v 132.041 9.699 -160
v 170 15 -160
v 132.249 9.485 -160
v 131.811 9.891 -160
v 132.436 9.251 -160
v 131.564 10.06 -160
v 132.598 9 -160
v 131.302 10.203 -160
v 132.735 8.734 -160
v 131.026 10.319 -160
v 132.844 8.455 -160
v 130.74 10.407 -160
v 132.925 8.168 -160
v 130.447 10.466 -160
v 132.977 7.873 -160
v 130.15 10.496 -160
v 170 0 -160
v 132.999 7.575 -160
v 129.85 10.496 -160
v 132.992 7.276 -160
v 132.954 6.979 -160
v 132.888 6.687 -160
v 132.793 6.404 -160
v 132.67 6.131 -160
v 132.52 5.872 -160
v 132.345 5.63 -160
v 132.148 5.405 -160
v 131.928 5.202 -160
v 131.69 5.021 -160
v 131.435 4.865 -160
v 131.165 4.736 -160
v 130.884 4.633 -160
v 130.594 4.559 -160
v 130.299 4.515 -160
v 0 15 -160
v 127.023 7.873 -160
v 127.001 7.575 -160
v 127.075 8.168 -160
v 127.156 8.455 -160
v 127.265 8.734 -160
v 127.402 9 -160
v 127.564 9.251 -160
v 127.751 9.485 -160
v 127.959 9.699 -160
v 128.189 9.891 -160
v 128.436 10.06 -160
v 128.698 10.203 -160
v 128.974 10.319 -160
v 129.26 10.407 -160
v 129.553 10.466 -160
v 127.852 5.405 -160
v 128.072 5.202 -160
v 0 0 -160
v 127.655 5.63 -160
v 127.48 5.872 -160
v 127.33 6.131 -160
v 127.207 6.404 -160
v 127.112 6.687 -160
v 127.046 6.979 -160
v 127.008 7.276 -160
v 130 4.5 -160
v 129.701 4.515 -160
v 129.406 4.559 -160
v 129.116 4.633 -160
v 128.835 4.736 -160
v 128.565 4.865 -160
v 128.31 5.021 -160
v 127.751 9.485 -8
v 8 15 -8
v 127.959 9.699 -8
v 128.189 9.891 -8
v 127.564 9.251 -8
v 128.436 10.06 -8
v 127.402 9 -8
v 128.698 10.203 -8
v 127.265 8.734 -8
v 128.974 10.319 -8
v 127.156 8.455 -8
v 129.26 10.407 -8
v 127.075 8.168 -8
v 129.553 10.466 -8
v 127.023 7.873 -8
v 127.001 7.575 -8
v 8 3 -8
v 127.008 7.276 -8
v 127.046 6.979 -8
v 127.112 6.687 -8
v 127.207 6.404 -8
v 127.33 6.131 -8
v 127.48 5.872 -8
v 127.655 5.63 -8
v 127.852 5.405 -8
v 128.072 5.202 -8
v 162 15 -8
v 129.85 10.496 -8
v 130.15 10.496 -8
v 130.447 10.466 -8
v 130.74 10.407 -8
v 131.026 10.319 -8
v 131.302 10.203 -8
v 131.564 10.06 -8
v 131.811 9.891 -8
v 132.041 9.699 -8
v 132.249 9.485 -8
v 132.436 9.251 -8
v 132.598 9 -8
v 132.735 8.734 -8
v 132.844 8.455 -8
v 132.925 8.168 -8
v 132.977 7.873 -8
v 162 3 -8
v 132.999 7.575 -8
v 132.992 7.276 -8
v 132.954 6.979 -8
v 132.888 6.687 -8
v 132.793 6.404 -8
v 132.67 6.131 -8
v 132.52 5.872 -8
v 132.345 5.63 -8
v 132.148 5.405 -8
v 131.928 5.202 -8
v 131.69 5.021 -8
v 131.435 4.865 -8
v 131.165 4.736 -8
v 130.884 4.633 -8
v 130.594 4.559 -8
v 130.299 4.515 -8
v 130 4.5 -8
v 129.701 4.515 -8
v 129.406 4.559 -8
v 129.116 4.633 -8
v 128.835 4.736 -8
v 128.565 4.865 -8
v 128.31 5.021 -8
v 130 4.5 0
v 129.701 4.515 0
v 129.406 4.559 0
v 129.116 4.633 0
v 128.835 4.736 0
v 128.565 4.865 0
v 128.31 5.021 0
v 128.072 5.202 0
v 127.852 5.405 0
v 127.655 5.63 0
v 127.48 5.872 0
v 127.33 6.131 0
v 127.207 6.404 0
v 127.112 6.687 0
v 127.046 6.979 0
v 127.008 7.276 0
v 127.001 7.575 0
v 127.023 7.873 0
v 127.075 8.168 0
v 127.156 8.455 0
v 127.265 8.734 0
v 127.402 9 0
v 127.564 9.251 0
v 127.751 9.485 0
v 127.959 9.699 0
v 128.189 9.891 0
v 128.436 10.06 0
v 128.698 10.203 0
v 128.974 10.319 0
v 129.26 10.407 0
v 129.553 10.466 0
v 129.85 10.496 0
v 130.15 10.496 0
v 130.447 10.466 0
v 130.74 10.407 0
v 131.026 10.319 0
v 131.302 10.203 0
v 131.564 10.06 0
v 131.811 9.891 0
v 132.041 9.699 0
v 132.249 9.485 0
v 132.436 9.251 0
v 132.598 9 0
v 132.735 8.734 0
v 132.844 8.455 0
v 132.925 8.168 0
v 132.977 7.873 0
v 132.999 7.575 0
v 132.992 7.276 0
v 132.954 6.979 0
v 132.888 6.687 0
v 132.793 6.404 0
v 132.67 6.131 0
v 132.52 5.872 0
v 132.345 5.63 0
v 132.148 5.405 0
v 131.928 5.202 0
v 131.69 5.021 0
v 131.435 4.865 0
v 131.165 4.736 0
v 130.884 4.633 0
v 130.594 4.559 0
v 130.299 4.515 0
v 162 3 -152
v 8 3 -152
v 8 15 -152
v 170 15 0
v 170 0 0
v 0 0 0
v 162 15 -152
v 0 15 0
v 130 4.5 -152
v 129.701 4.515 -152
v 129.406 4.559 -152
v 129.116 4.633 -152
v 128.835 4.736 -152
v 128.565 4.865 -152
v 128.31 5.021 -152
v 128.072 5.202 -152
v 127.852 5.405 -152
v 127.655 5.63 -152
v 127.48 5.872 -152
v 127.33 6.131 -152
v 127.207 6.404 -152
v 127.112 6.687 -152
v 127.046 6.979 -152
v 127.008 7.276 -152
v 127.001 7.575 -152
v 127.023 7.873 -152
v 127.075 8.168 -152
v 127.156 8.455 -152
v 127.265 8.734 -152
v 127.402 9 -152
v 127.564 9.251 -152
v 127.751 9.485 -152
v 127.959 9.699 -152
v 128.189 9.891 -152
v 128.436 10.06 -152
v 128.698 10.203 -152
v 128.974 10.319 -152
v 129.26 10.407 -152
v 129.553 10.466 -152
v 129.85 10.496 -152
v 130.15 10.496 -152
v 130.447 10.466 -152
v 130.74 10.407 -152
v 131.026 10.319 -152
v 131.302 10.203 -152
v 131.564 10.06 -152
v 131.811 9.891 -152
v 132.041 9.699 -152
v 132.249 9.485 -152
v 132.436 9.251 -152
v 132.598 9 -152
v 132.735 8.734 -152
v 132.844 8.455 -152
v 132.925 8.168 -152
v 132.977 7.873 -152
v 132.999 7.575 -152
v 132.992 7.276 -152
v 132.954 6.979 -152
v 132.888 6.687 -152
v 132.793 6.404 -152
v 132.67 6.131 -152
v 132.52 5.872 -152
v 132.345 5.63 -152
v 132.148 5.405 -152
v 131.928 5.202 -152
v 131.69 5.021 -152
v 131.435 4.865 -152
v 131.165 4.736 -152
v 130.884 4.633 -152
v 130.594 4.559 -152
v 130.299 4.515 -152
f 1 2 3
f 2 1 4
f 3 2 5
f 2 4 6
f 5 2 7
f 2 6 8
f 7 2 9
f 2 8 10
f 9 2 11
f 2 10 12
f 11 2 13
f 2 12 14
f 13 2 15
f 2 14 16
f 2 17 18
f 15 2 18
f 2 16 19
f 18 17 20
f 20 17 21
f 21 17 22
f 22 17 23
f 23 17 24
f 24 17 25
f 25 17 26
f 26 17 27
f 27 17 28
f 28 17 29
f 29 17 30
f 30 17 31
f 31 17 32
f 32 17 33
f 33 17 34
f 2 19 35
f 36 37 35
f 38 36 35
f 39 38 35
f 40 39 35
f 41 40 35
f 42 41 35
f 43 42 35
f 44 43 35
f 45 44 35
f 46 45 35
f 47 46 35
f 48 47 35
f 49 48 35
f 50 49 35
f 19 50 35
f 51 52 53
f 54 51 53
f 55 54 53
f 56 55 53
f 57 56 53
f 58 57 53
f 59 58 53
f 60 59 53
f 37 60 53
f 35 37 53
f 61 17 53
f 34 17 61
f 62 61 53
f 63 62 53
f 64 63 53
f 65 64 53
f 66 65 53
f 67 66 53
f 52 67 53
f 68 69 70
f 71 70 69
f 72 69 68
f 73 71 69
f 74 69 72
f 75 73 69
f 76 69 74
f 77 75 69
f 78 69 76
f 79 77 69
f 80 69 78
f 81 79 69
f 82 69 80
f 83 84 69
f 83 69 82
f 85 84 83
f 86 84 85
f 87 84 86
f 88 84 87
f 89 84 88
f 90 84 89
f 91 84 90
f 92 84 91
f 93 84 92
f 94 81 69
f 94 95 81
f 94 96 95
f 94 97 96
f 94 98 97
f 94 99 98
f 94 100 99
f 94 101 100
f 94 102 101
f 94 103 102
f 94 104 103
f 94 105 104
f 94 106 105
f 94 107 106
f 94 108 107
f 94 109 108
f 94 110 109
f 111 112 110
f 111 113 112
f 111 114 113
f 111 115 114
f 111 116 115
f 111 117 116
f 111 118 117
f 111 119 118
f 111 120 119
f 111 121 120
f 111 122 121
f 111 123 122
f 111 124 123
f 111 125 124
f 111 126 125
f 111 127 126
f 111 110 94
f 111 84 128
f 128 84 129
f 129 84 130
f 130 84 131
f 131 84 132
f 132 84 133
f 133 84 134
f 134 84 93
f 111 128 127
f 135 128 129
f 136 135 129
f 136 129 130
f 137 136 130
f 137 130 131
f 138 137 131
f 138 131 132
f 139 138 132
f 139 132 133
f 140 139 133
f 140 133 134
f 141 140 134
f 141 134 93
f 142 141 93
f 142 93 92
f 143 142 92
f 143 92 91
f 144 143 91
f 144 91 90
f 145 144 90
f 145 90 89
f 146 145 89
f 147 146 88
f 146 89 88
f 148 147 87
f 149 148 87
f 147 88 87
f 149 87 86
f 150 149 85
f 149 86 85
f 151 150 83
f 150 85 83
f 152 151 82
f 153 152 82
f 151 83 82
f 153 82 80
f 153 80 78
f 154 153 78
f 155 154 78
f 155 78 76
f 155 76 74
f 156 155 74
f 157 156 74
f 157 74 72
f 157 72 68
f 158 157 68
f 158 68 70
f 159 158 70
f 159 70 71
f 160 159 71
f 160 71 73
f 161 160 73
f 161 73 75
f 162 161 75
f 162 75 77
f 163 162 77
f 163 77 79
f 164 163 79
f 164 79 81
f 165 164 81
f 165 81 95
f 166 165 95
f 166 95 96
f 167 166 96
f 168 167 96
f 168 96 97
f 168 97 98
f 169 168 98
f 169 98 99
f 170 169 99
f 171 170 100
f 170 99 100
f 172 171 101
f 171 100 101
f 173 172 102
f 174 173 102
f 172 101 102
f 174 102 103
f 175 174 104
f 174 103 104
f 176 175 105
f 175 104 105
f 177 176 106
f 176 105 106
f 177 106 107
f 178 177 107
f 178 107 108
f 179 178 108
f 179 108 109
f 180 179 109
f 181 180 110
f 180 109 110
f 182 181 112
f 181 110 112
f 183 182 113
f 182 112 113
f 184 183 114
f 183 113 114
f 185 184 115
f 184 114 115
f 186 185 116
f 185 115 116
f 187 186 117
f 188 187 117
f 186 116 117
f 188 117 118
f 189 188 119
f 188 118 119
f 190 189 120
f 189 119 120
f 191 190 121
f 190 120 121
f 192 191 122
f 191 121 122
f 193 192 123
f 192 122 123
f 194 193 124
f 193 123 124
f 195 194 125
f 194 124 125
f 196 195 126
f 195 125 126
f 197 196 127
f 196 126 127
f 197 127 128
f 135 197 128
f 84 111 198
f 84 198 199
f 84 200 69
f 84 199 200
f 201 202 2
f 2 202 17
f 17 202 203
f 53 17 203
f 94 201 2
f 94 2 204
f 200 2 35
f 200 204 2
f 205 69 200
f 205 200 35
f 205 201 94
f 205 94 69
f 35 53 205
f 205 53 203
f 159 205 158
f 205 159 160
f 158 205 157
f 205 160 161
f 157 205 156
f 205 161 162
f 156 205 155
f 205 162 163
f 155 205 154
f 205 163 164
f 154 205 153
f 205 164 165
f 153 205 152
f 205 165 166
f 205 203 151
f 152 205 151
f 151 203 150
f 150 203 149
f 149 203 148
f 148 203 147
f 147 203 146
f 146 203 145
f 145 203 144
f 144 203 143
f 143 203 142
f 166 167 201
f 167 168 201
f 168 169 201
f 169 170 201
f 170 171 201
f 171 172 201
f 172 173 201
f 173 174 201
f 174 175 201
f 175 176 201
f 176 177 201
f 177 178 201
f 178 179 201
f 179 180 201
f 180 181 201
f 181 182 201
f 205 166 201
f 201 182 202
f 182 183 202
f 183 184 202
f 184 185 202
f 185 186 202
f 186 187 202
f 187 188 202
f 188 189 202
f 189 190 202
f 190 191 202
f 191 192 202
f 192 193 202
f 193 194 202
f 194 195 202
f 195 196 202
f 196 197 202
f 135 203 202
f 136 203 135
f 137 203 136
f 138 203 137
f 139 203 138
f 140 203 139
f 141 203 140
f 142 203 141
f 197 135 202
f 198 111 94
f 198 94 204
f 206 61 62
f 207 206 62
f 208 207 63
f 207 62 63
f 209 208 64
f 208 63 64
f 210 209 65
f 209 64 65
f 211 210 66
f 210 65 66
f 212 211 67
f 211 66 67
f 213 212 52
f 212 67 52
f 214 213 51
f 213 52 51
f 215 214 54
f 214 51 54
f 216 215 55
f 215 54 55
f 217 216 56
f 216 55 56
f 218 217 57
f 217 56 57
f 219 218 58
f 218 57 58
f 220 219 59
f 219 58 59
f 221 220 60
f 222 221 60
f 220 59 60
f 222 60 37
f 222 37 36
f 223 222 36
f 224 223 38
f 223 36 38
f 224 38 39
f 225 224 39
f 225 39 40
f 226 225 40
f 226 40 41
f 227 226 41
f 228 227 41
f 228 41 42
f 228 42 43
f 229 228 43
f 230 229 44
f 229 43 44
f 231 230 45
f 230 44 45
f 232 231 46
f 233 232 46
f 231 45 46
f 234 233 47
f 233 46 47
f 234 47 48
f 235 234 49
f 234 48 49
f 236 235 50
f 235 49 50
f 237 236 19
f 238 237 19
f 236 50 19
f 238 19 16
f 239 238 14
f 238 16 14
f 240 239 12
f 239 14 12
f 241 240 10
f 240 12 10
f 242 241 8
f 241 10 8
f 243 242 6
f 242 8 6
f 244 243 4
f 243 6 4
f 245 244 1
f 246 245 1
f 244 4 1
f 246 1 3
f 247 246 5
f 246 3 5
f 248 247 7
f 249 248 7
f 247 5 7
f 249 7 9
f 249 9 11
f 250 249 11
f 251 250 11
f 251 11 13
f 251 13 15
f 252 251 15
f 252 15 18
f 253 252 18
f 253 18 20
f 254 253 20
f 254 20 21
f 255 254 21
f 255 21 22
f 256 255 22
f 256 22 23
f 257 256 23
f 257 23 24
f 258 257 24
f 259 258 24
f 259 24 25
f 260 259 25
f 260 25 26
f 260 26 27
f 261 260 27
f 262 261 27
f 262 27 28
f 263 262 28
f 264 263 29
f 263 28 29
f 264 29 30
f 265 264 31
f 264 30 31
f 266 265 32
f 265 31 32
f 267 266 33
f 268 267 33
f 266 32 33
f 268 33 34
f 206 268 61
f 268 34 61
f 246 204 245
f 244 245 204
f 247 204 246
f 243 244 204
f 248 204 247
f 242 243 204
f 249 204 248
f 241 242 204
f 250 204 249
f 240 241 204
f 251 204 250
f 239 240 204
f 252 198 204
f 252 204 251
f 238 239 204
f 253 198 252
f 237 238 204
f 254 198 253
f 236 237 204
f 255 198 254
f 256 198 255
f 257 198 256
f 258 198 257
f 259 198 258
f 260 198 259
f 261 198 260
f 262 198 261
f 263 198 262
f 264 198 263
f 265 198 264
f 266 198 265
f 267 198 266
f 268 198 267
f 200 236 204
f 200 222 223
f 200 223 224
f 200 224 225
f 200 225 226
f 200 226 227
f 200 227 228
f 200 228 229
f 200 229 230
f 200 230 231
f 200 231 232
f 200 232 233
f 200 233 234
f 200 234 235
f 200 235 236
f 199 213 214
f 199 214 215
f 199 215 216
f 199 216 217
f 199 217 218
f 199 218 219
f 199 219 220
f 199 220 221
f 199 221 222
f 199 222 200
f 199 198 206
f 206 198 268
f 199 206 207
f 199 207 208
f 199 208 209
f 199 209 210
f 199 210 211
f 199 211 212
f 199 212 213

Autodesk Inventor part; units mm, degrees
ref_plane "YZ Plane" through (0, 0, 0) normal (1, 0, 0) x (0, 1, 0)
ref_plane "XZ Plane" through (0, 0, 0) normal (0, 1, 0) x (-1, 0, 0)
ref_plane "XY Plane" through (0, 0, 0) normal (0, 0, 1) x (1, 0, 0)
sketch "Sketch2" plane through (0, 0, 0) normal (0, 1, 0) x (-1, 0, 0)
  line L0 (0, 0) -> (-170, 0)
  line L1 (-170, 0) -> (-170, -160)
  line L2 (-170, -160) -> (0, -160)
  line L3 (0, -160) -> (0, 0)
  line L4 (-8, -8) -> (-162, -8)
  line L5 (-162, -8) -> (-162, -152)
  line L6 (-162, -152) -> (-8, -152)
  line L7 (-8, -152) -> (-8, -8)
  dimension "d0" = 170
  dimension "d1" = 160
  dimension "d2" = 154
  dimension "d3" = 144
  dimension "d4" = 8
  dimension "d5" = 8
extrude "Extrusion1" add sketch "Sketch2" along normal blind 15
extrude "Extrusion2" add sketch "Sketch2" along normal blind 3 contours L7 L6 L5 L4
sketch "Sketch3" plane through (0, 0, 0) normal (0, 0, 1) x (1, 0, 0)
  line L0 (0, 0) -> (0, 7.5)
  line L1 (0, 0) -> (0, 15) projected
  line L2 (0, 7.5) -> (170, 7.5)
  line L3 (170, 0) -> (170, 15) projected
  line L4 (0, 7.5) -> (40, 7.5)
  line L5 (170, 7.5) -> (130, 7.5)
  dimension "d10" = 40
  dimension "d11" = 40
hole "Hole1" at (130, 7.5, 0) direction (0, 0, -1) diameter 6 depth 160
properties part number "baseplate"
